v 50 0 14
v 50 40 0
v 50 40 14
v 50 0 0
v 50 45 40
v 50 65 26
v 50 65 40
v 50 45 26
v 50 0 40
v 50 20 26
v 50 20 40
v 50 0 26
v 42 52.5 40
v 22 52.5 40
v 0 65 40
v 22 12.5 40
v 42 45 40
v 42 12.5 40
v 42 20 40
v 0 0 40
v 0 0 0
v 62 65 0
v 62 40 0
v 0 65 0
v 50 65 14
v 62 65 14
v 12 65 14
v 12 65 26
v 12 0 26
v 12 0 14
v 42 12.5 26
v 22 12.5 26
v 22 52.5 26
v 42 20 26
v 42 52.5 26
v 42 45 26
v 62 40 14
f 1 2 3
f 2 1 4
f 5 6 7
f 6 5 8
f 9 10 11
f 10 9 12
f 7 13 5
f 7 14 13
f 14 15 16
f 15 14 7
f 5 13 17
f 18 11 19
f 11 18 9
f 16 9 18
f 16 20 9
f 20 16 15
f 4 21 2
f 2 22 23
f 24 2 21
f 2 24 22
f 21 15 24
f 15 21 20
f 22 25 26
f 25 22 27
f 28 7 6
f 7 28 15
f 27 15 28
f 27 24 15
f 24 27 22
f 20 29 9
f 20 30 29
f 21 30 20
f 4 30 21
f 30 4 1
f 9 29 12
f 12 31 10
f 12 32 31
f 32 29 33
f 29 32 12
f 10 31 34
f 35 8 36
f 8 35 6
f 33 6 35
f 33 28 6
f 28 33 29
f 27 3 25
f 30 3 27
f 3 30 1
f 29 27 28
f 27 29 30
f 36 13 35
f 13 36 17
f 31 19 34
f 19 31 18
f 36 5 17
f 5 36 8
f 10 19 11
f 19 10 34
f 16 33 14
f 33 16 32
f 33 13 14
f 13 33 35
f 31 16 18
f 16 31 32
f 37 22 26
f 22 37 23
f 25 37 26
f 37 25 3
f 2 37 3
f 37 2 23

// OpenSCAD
union() {
    difference() {
        cube([50, 65, 40]);
    
        translate([12, 0, 14])
        cube([38, 65, 12]);
    
        translate([42, 20, 26])
        cube([8, 25, 14]);
    
        translate([22, 12.5, 26])
        cube([20, 40, 14]);
    }
    
    translate([50, 40, 0])
    cube([12, 25, 14]);
}
